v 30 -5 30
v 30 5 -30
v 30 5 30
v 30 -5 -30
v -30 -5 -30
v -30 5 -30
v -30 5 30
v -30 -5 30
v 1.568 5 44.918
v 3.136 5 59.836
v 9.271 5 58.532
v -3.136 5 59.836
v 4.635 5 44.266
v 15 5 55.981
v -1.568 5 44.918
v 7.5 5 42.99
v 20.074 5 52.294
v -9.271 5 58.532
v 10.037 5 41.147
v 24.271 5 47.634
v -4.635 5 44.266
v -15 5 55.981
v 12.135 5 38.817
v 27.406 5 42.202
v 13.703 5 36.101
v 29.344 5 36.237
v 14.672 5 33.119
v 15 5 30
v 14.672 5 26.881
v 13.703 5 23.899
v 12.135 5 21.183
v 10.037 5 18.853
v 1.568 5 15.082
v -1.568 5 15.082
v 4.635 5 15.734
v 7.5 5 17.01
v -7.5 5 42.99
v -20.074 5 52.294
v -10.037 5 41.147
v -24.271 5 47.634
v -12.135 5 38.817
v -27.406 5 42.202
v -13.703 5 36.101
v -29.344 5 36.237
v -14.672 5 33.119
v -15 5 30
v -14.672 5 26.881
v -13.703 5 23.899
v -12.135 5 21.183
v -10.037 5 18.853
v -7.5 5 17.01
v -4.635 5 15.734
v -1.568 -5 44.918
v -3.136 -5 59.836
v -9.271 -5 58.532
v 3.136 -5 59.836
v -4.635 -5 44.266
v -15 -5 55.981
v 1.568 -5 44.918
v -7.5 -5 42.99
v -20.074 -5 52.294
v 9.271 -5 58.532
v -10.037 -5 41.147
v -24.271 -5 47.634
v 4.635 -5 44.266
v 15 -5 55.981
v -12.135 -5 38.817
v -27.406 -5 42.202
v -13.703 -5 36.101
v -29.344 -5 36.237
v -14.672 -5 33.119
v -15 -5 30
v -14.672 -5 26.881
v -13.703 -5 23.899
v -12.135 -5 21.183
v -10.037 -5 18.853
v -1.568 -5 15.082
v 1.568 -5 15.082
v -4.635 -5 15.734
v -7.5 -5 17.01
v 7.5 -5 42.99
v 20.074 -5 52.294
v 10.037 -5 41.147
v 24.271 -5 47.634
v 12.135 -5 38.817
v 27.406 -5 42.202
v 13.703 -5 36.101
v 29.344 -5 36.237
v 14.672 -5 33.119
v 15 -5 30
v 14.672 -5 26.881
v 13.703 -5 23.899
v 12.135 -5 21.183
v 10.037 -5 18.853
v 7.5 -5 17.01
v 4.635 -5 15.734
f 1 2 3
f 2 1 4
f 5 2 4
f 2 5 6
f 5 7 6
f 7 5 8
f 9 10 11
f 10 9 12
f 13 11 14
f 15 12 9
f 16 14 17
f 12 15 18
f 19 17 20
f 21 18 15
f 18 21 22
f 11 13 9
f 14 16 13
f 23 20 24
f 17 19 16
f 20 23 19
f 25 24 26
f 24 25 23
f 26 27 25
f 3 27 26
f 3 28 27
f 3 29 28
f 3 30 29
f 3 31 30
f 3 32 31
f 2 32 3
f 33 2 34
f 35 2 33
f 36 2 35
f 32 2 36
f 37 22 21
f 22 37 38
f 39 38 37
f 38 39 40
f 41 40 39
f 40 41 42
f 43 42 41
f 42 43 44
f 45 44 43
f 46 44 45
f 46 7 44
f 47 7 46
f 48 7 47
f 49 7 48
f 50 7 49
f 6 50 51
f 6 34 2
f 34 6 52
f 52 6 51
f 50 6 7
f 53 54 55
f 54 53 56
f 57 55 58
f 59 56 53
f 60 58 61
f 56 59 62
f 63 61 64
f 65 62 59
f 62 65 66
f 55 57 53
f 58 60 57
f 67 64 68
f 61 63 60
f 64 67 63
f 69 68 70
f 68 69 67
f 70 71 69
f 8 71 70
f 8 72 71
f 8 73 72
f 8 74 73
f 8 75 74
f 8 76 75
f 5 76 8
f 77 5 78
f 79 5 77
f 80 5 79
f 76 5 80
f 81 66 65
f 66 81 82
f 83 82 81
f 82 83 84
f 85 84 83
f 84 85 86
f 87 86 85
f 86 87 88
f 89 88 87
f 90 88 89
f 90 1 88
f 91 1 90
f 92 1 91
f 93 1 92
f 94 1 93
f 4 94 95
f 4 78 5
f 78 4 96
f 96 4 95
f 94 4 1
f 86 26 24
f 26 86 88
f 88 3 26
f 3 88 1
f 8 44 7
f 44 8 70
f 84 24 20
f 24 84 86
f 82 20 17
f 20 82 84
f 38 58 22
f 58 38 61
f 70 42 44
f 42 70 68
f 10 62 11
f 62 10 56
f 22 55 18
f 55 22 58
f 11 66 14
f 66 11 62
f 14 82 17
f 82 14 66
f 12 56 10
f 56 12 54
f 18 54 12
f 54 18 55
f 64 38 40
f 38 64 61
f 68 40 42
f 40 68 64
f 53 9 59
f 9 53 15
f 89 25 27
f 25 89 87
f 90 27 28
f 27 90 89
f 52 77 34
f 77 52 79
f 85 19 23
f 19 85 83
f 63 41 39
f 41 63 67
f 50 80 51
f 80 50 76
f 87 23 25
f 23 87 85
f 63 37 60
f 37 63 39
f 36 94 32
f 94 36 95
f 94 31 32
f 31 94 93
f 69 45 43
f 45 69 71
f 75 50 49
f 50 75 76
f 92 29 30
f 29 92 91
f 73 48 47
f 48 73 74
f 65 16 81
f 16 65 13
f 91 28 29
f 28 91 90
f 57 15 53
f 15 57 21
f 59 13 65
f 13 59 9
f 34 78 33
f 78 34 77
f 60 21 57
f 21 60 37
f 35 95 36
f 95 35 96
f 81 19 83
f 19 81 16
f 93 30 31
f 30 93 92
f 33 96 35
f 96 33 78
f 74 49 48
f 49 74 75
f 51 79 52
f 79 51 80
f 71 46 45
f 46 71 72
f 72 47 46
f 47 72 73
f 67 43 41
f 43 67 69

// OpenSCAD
module pieno(){
cube([60,10,60], center =true);

translate([0,0,30])
rotate([90,0,0])
cylinder(10,30,30,$fn=30,center=true);
}


difference(){

pieno();

translate([0,0,30])
rotate([90,0,0])
cylinder(12,15,15,$fn=30,center=true);

}
